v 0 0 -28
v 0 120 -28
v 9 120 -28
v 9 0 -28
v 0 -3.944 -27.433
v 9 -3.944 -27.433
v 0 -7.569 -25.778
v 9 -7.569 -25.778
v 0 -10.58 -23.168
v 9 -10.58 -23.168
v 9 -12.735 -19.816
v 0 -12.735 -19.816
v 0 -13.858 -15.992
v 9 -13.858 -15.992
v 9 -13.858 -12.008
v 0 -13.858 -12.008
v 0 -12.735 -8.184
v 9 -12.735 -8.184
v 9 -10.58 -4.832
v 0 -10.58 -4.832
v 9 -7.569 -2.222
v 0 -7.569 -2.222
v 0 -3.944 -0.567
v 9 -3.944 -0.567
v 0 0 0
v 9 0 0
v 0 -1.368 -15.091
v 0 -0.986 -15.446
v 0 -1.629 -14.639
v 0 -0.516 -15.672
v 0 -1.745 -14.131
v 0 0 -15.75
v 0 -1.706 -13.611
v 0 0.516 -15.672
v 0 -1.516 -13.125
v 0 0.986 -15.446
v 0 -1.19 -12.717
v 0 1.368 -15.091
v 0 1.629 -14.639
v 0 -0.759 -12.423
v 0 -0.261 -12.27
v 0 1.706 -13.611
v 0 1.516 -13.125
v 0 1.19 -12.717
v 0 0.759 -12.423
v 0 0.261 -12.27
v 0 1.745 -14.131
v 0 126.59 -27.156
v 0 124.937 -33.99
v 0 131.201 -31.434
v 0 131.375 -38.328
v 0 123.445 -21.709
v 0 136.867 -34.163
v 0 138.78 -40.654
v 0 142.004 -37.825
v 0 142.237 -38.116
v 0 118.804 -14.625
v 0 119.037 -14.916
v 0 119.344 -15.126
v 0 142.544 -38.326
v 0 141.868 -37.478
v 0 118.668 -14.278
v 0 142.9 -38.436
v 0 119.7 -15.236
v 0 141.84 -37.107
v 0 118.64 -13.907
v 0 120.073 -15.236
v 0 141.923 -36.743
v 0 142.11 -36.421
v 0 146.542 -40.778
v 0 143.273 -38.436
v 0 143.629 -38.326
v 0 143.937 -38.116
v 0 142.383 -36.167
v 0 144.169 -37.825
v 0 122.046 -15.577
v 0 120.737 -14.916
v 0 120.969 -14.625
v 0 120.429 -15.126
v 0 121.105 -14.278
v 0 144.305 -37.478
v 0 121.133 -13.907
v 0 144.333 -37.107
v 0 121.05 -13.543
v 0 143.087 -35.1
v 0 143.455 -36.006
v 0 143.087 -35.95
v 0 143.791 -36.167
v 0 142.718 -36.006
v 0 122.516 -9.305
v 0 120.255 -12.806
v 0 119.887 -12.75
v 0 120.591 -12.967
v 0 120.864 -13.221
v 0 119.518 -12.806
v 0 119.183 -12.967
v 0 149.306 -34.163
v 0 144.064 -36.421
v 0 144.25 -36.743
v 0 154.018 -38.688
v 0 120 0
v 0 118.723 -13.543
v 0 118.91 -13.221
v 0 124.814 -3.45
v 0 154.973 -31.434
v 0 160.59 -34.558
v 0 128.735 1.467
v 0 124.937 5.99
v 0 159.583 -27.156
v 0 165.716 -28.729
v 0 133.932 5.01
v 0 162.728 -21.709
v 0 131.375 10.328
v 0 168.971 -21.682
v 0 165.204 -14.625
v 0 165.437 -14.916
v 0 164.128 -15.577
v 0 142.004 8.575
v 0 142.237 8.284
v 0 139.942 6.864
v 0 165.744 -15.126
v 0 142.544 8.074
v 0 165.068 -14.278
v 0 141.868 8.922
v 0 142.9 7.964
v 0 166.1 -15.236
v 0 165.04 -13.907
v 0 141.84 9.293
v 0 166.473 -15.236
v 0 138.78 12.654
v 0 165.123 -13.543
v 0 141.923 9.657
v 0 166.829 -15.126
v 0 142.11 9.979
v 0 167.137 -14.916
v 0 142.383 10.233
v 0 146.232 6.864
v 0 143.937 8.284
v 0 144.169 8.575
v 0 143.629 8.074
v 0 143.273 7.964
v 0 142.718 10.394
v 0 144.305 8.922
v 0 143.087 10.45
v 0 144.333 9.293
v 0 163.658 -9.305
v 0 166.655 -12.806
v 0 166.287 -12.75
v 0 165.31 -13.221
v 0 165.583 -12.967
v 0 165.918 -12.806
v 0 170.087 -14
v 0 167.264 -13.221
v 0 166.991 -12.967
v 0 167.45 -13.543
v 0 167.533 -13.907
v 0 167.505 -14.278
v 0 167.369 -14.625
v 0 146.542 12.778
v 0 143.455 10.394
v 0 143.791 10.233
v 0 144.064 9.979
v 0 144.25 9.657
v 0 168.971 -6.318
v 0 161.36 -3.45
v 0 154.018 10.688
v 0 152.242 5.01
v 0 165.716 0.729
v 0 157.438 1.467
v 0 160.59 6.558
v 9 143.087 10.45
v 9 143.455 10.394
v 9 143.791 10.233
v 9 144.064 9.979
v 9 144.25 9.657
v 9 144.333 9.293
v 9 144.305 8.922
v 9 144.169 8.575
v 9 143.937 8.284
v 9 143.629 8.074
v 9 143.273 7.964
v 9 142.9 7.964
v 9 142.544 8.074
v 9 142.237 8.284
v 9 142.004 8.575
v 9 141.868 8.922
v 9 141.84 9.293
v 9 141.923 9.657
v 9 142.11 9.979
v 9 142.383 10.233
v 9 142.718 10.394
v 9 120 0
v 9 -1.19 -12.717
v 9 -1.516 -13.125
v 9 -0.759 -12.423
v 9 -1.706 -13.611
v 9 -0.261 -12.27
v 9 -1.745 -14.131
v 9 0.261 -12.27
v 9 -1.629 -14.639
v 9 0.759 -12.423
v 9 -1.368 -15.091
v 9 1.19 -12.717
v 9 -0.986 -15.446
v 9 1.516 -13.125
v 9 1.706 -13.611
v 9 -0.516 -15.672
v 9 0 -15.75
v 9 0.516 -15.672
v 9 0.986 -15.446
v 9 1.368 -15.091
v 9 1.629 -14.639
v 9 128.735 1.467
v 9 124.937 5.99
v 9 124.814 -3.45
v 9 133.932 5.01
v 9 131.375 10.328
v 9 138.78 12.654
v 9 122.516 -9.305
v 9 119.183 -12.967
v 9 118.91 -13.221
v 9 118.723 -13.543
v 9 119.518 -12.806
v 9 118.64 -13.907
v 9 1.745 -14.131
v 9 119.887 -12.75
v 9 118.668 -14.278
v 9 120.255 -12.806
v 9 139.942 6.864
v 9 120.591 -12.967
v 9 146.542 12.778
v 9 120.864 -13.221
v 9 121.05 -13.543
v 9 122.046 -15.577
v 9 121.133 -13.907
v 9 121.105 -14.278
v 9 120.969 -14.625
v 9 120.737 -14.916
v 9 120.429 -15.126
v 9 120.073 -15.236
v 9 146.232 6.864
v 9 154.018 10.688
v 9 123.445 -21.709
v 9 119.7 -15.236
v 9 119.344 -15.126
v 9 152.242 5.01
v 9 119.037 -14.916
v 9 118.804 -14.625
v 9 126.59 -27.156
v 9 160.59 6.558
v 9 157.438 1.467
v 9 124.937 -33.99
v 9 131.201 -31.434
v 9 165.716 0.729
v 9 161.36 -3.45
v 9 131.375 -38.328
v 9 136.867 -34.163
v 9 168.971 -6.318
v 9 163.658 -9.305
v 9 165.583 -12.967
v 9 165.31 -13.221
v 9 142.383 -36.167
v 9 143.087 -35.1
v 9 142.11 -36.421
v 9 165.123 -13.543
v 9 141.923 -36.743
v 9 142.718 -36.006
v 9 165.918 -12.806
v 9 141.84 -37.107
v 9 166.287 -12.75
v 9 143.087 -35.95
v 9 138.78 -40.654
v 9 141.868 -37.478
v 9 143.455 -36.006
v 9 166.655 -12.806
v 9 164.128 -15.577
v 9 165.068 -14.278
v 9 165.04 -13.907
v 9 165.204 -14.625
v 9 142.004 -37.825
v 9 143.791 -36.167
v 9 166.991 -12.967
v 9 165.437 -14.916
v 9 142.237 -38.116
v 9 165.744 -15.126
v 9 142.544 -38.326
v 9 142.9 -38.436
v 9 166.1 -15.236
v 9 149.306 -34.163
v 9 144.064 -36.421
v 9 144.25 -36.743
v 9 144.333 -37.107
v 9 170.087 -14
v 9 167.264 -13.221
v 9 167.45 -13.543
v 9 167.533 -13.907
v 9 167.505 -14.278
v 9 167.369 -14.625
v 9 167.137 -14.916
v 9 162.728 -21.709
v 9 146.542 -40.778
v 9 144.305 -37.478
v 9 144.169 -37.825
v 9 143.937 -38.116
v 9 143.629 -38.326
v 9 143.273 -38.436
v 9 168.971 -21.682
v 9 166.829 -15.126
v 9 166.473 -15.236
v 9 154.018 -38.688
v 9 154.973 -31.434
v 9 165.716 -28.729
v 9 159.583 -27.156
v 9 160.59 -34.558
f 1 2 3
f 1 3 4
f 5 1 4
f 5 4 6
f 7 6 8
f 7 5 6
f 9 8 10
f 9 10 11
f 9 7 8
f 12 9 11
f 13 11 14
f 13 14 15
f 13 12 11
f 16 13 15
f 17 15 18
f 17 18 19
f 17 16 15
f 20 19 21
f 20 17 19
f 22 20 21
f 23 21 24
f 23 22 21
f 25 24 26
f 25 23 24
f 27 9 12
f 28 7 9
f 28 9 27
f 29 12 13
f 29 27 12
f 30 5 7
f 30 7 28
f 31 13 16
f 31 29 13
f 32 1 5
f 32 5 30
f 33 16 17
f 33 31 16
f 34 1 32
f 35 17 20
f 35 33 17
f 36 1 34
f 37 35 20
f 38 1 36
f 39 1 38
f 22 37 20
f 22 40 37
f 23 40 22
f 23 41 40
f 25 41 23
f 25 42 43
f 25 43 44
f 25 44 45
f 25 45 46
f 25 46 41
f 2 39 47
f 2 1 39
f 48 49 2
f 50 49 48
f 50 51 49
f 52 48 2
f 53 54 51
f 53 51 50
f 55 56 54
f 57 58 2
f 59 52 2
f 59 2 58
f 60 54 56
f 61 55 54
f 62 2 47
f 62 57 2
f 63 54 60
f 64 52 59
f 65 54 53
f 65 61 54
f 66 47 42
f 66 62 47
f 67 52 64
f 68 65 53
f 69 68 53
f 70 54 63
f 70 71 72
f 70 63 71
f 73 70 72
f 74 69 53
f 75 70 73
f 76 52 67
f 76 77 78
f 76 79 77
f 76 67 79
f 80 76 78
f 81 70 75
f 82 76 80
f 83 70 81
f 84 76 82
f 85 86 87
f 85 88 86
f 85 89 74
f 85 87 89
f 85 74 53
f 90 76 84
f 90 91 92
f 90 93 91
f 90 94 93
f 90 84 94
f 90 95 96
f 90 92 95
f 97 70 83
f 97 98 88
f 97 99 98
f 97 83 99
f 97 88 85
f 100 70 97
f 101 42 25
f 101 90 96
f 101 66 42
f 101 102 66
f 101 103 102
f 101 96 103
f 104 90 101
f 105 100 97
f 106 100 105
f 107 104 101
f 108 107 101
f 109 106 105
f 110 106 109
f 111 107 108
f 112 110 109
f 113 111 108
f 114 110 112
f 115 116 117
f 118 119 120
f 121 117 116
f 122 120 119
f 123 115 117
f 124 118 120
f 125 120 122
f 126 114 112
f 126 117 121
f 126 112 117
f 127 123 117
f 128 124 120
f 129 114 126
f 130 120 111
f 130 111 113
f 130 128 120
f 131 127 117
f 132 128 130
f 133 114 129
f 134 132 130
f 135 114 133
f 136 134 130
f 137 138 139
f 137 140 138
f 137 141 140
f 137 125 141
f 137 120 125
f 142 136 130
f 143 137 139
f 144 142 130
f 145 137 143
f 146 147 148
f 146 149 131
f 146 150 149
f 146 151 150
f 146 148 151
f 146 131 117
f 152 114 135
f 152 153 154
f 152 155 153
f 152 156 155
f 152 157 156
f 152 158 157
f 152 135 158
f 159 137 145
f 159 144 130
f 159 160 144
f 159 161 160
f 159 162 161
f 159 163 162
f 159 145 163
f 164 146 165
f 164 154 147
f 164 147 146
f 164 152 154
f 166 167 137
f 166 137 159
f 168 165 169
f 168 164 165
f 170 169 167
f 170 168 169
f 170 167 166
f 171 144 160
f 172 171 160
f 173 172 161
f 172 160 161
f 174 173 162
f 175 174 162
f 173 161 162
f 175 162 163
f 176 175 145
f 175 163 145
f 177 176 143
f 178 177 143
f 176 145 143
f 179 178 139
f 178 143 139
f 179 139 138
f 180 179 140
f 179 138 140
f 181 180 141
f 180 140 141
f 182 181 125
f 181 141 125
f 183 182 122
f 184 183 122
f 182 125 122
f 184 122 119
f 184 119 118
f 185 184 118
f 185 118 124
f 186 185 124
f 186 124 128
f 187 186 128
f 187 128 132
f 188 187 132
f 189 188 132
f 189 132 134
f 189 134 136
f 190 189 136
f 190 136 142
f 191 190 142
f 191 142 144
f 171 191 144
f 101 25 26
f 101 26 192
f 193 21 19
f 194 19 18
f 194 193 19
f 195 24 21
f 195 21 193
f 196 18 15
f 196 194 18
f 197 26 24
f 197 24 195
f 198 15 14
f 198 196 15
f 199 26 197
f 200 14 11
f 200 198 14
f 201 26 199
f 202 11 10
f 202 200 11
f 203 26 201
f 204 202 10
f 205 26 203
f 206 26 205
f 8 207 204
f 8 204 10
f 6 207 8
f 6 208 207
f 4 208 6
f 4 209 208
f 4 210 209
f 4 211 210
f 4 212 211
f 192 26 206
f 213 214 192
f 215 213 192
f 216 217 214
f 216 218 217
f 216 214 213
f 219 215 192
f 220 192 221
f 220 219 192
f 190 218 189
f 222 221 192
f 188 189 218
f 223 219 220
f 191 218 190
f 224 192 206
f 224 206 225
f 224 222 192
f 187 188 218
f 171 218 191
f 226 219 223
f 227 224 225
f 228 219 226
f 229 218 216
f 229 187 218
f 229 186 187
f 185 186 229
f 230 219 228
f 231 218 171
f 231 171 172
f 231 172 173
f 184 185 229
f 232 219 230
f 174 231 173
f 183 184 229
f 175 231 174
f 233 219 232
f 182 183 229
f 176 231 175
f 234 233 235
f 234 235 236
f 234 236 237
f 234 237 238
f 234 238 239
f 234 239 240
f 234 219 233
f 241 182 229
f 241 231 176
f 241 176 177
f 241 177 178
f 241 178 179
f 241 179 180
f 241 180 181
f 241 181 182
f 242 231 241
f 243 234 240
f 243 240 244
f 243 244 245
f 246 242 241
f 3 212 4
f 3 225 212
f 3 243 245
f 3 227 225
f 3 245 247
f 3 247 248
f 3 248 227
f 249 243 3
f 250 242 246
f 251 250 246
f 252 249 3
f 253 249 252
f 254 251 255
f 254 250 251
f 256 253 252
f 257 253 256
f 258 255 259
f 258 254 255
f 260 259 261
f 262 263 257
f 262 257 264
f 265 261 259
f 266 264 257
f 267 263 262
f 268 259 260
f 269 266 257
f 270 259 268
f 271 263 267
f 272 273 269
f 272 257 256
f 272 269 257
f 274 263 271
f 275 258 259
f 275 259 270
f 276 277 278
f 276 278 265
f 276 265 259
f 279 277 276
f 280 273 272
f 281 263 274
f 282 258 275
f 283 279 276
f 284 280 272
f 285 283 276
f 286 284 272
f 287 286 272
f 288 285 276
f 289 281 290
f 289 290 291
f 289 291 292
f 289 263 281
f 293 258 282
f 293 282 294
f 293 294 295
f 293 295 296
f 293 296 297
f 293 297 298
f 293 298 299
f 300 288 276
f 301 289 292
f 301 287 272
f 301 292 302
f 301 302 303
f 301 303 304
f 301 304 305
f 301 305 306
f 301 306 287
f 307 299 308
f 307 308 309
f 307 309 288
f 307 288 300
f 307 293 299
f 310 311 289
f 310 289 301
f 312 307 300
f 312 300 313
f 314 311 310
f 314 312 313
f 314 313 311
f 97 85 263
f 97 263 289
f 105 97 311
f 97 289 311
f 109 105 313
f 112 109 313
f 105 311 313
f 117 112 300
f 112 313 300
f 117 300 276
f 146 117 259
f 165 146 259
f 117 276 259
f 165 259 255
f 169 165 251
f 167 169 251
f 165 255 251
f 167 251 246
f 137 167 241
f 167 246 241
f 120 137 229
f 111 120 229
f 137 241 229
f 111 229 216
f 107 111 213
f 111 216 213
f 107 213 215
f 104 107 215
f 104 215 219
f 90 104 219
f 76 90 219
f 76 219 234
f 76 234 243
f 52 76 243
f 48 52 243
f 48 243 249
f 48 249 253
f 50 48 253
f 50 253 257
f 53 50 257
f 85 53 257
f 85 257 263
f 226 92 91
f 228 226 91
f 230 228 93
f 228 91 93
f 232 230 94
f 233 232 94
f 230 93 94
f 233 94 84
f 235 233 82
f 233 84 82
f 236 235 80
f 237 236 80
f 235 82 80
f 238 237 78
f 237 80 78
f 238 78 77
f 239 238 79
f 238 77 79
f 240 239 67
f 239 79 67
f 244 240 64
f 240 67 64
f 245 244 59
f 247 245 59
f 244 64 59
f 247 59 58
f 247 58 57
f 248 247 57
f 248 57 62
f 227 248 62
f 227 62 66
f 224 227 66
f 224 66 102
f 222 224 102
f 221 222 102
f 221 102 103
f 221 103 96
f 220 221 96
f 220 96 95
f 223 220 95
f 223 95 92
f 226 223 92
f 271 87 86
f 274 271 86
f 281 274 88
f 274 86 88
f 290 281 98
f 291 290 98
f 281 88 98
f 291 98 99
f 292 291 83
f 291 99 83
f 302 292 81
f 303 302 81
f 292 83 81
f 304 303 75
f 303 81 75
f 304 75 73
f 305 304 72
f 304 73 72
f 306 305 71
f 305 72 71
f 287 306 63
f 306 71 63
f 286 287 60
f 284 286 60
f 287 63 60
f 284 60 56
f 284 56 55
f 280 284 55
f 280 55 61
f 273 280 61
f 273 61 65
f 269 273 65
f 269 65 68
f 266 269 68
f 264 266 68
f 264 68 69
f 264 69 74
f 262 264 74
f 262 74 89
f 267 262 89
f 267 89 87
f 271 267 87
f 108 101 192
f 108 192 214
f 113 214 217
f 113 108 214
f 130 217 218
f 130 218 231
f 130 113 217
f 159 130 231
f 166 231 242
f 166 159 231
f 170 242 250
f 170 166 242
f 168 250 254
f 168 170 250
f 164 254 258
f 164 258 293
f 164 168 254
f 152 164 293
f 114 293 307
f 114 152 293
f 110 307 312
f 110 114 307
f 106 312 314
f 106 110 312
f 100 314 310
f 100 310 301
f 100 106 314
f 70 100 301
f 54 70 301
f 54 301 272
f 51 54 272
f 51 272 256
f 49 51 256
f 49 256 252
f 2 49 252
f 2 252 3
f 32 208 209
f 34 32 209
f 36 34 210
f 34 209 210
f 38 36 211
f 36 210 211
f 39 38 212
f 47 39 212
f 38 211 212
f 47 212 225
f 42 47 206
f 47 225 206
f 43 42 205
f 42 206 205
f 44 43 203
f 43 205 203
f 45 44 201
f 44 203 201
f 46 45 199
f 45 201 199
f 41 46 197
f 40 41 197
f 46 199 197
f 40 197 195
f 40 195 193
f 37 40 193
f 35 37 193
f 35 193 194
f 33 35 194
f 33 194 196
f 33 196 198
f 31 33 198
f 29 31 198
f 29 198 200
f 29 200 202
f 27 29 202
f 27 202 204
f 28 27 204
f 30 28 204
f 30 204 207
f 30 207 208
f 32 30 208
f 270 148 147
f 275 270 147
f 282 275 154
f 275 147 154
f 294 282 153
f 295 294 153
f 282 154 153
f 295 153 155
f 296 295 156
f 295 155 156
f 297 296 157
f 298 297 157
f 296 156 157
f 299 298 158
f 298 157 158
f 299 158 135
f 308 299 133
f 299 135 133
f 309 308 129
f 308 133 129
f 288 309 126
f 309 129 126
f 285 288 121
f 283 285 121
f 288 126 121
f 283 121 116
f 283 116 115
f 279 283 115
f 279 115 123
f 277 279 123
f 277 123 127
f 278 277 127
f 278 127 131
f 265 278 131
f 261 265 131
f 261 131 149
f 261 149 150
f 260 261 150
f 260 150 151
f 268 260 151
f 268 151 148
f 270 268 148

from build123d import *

# Parameters (mm, degrees)
EXTRUDE_6_DEPTH      = 9
SKETCH_8_R           = 23.25
CUT_EXTRUDE_6_DEPTH  = 7
SKETCH_9_R           = 19.25
CUT_EXTRUDE_7_DEPTH  = 7
SKETCH_13_R          = 23.25
EXTRUDE_9_DEPTH      = 9
SKETCH_14_R          = 21.1
CUT_EXTRUDE_8_DEPTH  = 10
SKETCH_26_R          = 1.75
CUT_EXTRUDE_14_DEPTH = 10
SKETCH_25_R          = 1.25
CUT_EXTRUDE_15_DEPTH = 10


with BuildPart() as part:
    # 草图1 → 凸台-拉伸6 (new body)
    with BuildSketch(Plane(origin=(0, 0, 0), x_dir=(0, 0, -1), z_dir=(1, 0, 0))):
        with BuildLine():
            Line((0, 0), (0, 120))
            ThreePointArc((0, 120), (14, 170.086792761), (28, 120))
            Line((28, 120), (28, 0))
            ThreePointArc((28, 0), (14, -14), (0, 0))
        make_face()
    extrude(amount=EXTRUDE_6_DEPTH)

    # 草图8 → 切除-拉伸6 (cut)
    with BuildSketch(Plane(origin=(9, 0, 0), x_dir=(0, 0, -1), z_dir=(1, 0, 0))):
        with Locations((14, 143.086792761)):
            Circle(SKETCH_8_R)
    extrude(amount=-CUT_EXTRUDE_6_DEPTH, mode=Mode.SUBTRACT)

    # 草图9 → 切除-拉伸7 (cut)
    with BuildSketch(Plane(origin=(2, 0, 0), x_dir=(0, 0, -1), z_dir=(1, 0, 0))):
        with Locations((14, 143.086792761)):
            Circle(SKETCH_9_R)
    extrude(amount=-CUT_EXTRUDE_7_DEPTH, mode=Mode.SUBTRACT)

    # 草图13 → 凸台-拉伸9 (add)
    with BuildSketch(Plane(origin=(9, 0, 0), x_dir=(0, 0, -1), z_dir=(1, 0, 0))):
        with Locations((14, 143.086792761)):
            Circle(SKETCH_13_R)
    extrude(amount=-EXTRUDE_9_DEPTH)

    # 草图14 → 切除-拉伸8 (cut)
    with BuildSketch(Plane(origin=(9, 0, 0), x_dir=(0, 0, -1), z_dir=(1, 0, 0))):
        with Locations((14, 143.086792761)):
            Circle(SKETCH_14_R)
    extrude(amount=-CUT_EXTRUDE_8_DEPTH, mode=Mode.SUBTRACT)

    # 草图26 → 切除-拉伸14 (cut)
    with BuildSketch(Plane(origin=(9, 0, 0), x_dir=(0, 0, -1), z_dir=(1, 0, 0))):
        with Locations((14, 0)):
            Circle(SKETCH_26_R)
    extrude(amount=-CUT_EXTRUDE_14_DEPTH, mode=Mode.SUBTRACT)

    # 草图25 → 切除-拉伸15 (cut)
    with BuildSketch(Plane.ZY):
        with Locations((9.2, 143.086792761)):
            Circle(SKETCH_25_R)
        with Locations((-14, 119.886792761)):
            Circle(SKETCH_25_R)
        with Locations((-37.2, 143.086792761)):
            Circle(SKETCH_25_R)
        with Locations((-14, 166.286792761)):
            Circle(SKETCH_25_R)
    extrude(amount=-CUT_EXTRUDE_15_DEPTH, mode=Mode.SUBTRACT)


solid = part.part
